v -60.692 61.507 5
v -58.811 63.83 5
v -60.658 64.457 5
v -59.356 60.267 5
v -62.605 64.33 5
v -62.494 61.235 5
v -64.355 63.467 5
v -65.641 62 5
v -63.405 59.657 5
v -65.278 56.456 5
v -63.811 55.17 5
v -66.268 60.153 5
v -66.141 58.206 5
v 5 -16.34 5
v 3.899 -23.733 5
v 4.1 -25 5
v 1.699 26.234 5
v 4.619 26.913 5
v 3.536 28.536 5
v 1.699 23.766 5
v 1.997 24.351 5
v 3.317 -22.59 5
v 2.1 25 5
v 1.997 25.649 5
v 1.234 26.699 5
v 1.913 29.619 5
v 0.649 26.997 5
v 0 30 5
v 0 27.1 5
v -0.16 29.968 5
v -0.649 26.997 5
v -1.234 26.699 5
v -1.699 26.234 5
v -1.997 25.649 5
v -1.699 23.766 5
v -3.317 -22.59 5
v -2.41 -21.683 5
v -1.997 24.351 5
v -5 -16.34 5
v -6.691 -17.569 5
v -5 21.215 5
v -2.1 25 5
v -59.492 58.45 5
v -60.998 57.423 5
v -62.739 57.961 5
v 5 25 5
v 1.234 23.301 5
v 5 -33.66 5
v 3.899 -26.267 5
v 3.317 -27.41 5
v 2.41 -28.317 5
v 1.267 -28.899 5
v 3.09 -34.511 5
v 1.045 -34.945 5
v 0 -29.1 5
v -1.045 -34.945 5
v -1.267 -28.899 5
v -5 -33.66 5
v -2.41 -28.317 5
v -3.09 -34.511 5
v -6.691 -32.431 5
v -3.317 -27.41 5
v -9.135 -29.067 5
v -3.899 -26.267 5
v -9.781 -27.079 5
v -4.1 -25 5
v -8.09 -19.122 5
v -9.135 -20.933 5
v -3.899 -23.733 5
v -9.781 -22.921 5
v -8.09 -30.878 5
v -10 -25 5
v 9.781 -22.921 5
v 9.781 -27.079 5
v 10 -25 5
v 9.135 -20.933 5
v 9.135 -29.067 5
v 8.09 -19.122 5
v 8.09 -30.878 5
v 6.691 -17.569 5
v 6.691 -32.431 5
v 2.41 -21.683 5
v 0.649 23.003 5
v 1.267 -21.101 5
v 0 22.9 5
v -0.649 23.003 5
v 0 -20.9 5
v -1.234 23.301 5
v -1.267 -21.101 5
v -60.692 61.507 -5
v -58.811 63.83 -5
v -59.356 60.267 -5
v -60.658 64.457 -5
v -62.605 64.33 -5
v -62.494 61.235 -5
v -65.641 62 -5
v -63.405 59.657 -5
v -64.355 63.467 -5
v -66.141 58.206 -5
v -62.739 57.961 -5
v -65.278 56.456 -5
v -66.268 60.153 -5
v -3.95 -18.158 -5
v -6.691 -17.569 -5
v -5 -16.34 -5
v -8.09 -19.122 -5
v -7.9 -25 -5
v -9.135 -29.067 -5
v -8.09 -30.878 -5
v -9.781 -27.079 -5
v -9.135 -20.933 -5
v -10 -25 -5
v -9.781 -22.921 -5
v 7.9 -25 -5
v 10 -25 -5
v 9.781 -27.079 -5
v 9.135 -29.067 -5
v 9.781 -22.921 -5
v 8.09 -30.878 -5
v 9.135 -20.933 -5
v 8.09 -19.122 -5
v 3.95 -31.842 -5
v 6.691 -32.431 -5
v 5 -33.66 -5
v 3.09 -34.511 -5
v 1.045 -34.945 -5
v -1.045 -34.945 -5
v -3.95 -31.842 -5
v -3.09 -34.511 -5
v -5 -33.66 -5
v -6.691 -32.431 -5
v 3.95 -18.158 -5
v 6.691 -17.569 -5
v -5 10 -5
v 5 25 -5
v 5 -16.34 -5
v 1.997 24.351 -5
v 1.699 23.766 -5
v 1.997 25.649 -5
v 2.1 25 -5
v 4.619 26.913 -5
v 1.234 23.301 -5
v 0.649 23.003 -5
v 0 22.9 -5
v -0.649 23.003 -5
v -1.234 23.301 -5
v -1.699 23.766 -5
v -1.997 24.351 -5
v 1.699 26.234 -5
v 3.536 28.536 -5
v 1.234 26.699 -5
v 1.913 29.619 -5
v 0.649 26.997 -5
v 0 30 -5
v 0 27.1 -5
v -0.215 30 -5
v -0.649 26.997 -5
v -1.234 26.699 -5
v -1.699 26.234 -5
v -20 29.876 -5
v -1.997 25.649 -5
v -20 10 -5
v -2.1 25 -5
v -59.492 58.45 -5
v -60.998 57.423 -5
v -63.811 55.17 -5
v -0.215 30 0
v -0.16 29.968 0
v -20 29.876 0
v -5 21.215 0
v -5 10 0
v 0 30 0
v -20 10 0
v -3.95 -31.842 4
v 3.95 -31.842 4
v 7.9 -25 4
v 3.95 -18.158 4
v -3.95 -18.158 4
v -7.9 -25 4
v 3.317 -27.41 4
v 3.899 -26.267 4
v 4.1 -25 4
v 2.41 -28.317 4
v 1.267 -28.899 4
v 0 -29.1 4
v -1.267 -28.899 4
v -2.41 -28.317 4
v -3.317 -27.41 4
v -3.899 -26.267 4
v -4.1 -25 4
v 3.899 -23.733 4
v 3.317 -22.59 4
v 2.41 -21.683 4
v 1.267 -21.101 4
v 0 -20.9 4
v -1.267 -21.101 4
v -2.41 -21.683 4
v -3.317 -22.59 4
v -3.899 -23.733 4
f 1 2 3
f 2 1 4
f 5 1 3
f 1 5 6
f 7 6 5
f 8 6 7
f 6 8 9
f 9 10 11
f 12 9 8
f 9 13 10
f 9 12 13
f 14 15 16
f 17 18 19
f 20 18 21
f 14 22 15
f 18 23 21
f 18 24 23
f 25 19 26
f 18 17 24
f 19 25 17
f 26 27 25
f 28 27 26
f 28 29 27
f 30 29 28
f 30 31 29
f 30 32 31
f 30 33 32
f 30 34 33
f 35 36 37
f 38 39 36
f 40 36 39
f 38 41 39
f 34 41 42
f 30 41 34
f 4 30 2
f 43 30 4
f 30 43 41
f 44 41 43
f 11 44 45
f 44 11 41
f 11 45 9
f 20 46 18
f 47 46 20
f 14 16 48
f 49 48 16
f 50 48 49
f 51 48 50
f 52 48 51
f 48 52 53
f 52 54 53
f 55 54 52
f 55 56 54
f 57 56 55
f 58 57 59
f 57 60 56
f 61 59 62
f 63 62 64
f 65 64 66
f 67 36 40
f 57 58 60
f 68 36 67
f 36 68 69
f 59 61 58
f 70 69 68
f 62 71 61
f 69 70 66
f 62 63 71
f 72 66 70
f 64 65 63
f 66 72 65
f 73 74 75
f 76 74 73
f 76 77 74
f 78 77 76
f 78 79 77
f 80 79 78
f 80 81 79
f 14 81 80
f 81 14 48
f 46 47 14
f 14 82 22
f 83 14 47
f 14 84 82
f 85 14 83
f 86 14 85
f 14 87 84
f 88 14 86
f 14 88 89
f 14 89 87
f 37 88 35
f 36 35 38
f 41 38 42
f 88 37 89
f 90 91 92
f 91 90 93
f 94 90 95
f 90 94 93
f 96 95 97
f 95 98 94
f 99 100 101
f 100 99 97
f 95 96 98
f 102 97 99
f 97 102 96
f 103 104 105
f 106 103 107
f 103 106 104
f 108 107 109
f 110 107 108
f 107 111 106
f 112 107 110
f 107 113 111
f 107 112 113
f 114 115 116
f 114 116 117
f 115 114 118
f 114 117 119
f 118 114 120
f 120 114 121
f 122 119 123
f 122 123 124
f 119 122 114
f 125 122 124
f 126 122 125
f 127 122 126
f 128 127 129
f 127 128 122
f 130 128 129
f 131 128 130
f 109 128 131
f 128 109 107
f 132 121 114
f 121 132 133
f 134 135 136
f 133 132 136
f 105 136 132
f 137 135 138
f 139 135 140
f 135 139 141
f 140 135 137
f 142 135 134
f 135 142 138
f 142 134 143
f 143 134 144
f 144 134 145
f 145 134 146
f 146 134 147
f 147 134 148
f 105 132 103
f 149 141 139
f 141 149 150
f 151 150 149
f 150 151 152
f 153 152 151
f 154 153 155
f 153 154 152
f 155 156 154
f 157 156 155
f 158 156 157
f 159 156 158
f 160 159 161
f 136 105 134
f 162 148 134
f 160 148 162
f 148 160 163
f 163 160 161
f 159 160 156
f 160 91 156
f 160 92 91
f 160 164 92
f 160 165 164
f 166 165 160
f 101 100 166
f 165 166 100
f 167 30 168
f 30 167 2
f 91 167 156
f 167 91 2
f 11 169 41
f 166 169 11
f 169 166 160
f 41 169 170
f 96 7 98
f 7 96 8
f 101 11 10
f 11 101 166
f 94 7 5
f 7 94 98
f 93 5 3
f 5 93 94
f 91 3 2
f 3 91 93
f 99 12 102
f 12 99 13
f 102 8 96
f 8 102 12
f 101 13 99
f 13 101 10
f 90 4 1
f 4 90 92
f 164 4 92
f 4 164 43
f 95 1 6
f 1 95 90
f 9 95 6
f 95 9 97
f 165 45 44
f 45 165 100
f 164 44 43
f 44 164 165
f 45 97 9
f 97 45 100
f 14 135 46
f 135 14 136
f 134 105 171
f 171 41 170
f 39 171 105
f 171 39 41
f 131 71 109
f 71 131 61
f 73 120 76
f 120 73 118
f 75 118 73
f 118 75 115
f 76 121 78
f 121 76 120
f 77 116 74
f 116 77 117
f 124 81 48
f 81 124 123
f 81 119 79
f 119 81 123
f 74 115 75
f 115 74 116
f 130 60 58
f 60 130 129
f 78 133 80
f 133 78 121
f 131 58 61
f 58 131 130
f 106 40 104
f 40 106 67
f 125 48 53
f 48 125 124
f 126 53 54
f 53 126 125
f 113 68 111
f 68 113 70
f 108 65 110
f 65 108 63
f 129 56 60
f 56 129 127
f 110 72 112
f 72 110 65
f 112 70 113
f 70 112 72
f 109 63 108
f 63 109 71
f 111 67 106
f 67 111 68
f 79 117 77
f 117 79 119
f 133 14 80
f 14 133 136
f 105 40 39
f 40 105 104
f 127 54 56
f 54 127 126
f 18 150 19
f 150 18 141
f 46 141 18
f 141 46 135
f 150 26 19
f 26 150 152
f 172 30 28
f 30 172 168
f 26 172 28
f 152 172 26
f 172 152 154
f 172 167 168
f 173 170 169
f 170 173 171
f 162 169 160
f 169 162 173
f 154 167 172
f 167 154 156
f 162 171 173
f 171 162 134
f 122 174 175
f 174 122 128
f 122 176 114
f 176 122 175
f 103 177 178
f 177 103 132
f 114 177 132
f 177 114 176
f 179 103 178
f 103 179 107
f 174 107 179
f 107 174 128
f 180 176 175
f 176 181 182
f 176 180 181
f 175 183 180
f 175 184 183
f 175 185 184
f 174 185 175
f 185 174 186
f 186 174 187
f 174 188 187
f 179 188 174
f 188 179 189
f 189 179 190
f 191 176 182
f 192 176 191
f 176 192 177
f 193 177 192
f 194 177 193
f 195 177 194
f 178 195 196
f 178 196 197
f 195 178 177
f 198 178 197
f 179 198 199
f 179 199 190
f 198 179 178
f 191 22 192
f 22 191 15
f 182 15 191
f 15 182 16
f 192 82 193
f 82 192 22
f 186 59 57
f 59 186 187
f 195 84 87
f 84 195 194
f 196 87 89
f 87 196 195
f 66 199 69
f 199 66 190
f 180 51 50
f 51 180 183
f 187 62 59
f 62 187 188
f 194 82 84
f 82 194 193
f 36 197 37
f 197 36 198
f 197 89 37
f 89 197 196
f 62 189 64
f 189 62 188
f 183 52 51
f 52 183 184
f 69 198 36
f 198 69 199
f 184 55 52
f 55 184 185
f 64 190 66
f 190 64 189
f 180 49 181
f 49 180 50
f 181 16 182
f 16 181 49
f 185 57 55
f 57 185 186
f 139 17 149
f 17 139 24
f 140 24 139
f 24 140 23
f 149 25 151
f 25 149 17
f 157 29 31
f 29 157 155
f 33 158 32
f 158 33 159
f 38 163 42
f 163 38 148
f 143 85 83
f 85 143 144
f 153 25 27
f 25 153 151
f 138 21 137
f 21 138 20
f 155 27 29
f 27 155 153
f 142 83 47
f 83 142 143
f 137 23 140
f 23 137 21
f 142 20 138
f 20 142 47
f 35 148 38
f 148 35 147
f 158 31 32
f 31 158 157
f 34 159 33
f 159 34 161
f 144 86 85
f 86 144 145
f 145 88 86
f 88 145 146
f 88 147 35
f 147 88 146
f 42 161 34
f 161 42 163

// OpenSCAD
espesor_pieza=10;
ancho_pieza=10;
longitud_tensor=70;


suspension();

module suspension(){
	difference(){
		union(){
			//brazo principal
			cube([10,50,10], center=true);
			//redondeo alojamiento tuerca
			translate([0,-25,0])
			cylinder(r=20/2, h=10, center=true);
			//redondeo fin brazon ppal
			translate([0,25,0])
			cylinder(r=10/2, h=10, center=true);
			//brazo tensor
			
			translate([-31,42,0])
			rotate([0,0,-30])
			brazotensor();			
			
			//placa apoyo
			translate([-10,20,-2.5])
			cube([20,20,5], center=true);
		}


		translate([0,-25,-5])
		cylinder(r=15.8/2, h=9,$fn=6);
		
		//translate([0,-25,-5])
		
		translate([0,-25,0])
		cylinder(r=8.2/2, h=20,$fn=20);


		translate([0,25,0])
		cylinder(r=4.2/2, h=20,$fn=20,center=true);

		translate([-70,25,0])
			cylinder(r=4.2/2, h=15, center=true);
	}
}

module brazotensor(){
	difference(){
		union(){
			cube([longitud_tensor,ancho_pieza ,espesor_pieza],center=true);
			translate([longitud_tensor/2,0,0])
			cylinder(r=ancho_pieza/2, h=espesor_pieza, center=true);
			translate([-longitud_tensor/2,0,0])
			cylinder(r=ancho_pieza/2, h=espesor_pieza, center=true);
		}
		translate([longitud_tensor/2,0,0])
		cylinder(r=4.2/2, h=20, center=true);
		translate([-longitud_tensor/2,0,0])
		cylinder(r=4.2/2, h=20, center=true);
	}

}

//brazotensor();
